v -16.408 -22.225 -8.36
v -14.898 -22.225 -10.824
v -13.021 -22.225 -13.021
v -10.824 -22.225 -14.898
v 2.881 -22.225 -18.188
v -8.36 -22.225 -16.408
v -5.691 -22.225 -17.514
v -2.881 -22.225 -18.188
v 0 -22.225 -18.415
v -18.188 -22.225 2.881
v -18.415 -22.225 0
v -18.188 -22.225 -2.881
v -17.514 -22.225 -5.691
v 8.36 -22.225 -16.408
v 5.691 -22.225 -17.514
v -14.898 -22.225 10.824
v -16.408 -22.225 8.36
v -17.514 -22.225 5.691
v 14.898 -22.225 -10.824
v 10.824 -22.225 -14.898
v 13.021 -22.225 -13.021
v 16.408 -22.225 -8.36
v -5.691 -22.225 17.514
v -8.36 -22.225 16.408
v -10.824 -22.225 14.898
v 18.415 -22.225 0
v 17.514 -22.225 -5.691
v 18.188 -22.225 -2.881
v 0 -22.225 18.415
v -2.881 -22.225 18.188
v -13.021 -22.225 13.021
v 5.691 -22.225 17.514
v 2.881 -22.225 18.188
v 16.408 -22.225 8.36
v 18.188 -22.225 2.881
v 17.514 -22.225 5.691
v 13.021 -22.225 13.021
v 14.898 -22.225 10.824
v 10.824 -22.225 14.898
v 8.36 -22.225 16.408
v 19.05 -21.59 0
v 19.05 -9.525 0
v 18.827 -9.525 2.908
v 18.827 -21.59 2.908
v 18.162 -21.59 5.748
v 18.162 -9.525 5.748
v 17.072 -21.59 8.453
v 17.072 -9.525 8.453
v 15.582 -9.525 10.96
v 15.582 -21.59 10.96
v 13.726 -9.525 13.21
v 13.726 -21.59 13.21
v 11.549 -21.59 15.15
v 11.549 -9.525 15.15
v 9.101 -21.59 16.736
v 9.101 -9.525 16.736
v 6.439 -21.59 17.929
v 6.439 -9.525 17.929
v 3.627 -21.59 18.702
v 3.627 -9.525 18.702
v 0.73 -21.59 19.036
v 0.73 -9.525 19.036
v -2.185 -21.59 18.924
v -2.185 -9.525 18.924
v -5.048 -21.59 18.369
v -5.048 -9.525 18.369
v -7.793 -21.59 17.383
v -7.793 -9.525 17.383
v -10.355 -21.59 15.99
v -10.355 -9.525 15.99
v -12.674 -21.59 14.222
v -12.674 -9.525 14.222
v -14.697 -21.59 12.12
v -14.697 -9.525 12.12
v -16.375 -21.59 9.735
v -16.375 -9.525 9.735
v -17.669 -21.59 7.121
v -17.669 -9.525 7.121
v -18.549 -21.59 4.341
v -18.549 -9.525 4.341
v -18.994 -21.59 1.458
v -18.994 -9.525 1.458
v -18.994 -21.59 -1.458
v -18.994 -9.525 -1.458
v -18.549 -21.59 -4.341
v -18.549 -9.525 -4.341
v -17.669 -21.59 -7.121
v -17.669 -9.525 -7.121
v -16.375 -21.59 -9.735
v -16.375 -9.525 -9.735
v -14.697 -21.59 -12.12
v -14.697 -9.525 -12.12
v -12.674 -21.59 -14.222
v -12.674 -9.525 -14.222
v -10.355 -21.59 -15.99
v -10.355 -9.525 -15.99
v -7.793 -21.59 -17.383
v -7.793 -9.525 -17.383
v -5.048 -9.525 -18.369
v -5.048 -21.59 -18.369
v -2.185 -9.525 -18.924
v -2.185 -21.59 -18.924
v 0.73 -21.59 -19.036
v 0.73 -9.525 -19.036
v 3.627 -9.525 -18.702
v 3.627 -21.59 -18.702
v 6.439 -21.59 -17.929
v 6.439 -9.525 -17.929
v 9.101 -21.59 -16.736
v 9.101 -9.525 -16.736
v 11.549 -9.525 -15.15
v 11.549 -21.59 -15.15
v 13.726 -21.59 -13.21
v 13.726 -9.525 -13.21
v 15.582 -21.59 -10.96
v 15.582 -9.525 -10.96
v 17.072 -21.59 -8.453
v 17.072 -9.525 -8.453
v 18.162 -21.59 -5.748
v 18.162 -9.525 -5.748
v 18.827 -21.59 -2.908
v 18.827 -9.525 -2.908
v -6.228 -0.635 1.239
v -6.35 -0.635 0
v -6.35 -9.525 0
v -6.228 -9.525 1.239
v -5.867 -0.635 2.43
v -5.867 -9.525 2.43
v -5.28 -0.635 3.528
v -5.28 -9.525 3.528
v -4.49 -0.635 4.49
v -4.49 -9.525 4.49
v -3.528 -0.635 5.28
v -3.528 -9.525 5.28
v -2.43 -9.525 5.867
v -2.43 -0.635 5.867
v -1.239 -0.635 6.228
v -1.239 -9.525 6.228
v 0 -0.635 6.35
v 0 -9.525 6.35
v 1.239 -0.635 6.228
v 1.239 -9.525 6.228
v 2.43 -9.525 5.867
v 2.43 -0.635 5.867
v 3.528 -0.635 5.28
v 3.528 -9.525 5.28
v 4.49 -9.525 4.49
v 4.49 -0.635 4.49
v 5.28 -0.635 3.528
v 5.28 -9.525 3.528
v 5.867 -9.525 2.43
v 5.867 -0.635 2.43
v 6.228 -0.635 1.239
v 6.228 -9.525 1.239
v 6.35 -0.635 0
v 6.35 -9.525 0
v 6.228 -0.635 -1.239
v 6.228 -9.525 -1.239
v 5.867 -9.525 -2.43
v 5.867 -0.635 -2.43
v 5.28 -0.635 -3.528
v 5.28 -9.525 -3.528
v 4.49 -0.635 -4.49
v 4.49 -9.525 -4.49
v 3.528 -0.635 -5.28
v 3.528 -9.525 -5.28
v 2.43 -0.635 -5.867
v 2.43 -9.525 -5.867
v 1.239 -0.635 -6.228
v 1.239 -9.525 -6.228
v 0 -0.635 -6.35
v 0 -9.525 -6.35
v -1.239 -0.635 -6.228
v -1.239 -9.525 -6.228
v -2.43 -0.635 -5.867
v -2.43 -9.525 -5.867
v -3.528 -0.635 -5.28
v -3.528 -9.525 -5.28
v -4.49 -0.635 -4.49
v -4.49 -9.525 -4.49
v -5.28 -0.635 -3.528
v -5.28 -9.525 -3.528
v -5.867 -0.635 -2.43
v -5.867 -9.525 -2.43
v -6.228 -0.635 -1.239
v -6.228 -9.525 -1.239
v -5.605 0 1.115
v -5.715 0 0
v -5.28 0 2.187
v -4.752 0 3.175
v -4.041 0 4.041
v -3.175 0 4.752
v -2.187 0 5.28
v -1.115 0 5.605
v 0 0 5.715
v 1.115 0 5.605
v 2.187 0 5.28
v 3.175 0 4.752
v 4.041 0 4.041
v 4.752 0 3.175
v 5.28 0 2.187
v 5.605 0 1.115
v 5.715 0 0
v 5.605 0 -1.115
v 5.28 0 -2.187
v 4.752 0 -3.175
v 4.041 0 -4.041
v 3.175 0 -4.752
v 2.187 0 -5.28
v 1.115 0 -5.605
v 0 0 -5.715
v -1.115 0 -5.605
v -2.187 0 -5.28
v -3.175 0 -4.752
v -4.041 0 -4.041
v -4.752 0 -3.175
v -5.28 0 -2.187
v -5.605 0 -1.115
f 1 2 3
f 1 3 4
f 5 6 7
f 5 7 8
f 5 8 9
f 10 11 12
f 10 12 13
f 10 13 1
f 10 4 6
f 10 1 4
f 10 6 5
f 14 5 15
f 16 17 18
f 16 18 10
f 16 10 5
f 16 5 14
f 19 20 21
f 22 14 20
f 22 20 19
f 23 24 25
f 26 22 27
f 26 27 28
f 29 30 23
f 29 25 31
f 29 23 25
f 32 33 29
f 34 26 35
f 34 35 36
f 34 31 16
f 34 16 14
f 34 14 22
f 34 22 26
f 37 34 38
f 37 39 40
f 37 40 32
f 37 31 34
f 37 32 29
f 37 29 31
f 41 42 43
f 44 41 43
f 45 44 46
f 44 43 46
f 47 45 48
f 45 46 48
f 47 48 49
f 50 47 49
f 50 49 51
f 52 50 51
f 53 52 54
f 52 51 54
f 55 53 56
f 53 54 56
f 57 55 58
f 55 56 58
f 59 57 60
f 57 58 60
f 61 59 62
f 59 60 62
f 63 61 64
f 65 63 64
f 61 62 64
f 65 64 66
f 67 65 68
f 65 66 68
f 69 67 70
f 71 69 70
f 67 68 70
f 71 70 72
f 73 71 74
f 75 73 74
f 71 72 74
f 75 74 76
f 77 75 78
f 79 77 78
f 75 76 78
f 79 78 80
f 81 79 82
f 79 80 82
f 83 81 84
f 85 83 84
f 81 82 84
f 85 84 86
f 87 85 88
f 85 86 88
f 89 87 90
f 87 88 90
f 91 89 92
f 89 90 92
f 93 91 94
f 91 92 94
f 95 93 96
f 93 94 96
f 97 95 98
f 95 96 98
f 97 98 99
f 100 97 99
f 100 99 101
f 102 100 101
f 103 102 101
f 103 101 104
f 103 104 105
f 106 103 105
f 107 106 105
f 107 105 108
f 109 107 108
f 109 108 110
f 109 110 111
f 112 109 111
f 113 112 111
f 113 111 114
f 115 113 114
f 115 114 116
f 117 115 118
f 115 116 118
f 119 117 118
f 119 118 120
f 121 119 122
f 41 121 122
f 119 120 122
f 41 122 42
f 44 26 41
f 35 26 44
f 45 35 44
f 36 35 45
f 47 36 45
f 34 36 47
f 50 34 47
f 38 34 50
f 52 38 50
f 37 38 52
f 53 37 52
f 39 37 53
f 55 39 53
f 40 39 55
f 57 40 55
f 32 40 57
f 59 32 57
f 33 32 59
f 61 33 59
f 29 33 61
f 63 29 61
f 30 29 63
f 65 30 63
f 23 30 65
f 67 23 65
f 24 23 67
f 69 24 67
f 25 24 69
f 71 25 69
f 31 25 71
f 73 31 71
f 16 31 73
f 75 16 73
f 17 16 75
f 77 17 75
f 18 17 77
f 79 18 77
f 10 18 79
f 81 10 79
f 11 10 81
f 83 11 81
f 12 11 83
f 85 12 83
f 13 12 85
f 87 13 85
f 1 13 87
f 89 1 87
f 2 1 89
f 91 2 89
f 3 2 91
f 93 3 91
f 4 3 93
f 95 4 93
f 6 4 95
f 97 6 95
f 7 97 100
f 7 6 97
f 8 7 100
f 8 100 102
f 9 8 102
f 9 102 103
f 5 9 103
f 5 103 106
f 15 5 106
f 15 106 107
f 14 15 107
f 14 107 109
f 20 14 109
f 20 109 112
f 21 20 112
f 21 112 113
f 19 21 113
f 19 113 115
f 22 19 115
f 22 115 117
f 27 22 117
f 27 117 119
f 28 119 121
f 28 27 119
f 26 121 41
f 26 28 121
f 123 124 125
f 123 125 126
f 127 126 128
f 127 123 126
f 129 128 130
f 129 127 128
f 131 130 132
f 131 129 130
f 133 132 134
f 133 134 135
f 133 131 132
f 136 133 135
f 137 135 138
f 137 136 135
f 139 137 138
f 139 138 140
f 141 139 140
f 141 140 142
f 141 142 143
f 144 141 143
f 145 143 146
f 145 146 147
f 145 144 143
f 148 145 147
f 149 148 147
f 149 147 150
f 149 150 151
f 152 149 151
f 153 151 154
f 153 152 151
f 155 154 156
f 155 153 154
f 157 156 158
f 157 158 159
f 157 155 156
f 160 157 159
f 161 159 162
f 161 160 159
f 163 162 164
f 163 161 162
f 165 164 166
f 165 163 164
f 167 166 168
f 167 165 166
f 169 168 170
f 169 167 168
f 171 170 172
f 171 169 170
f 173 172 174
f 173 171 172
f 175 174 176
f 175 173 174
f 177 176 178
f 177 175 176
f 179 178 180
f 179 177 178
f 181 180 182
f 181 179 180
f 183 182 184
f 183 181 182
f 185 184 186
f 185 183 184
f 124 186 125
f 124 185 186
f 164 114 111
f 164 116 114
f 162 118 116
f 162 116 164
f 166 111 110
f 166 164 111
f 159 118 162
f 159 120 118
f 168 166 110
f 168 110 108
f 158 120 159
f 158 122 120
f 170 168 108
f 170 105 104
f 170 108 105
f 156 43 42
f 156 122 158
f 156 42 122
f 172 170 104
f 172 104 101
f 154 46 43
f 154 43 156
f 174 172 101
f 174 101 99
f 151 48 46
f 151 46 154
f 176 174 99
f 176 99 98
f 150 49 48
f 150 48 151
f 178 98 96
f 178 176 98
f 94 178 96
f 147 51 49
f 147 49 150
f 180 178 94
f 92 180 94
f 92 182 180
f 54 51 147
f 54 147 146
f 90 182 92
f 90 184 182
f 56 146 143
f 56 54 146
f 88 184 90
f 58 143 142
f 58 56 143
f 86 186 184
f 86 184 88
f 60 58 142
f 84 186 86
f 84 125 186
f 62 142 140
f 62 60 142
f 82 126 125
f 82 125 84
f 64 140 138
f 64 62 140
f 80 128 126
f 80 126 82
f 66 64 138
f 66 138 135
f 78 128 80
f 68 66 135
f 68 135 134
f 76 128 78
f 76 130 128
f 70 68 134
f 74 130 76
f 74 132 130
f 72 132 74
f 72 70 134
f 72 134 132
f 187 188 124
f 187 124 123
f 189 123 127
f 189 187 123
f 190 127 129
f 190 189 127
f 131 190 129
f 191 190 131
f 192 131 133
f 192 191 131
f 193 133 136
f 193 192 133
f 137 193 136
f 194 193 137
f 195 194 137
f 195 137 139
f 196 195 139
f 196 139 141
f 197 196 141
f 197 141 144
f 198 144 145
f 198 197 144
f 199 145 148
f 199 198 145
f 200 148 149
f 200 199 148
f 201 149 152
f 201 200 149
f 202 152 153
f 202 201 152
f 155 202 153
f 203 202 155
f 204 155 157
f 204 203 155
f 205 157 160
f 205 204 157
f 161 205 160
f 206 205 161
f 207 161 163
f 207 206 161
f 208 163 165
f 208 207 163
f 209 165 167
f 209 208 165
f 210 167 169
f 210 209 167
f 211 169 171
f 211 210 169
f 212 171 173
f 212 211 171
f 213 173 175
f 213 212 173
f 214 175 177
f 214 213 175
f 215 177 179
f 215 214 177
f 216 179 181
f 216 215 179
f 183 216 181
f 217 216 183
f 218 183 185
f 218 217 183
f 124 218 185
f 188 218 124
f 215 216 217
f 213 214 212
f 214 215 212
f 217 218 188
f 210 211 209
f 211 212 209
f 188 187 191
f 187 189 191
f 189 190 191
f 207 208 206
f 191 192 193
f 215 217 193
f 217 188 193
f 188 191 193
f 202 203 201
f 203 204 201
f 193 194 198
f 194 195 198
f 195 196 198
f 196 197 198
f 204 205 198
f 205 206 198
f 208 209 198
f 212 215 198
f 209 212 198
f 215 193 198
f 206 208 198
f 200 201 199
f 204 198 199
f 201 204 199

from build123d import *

# Parameters (mm, degrees)
F0_R     = 19.05
F1_DEPTH = 22.225
F2_R     = 19.05
F2_R_2   = 6.35
F3_DEPTH = 9.525
F4_SIZE  = 0.635


with BuildPart() as f1:
    # F0 (on Front) → F1 (new body)
    with BuildSketch(Plane.XZ):
        Circle(F0_R)
    extrude(amount=F1_DEPTH)

    # F2 (on face) → F3 (cut)
    with BuildSketch(Plane(origin=(0, 0, 0), x_dir=(-1, 0, 0), z_dir=(0, 1, 0))):
        Circle(F2_R)
        Circle(F2_R_2, mode=Mode.SUBTRACT)
    extrude(amount=-F3_DEPTH, mode=Mode.SUBTRACT)

    # F4
    f4_edges = [f1.edges().sort_by_distance(p)[0] for p in [
        (6.35, 0, 0),
        (-19.05, -22.225, 0),
    ]]
    chamfer(f4_edges, length=F4_SIZE)


solid = f1.part
